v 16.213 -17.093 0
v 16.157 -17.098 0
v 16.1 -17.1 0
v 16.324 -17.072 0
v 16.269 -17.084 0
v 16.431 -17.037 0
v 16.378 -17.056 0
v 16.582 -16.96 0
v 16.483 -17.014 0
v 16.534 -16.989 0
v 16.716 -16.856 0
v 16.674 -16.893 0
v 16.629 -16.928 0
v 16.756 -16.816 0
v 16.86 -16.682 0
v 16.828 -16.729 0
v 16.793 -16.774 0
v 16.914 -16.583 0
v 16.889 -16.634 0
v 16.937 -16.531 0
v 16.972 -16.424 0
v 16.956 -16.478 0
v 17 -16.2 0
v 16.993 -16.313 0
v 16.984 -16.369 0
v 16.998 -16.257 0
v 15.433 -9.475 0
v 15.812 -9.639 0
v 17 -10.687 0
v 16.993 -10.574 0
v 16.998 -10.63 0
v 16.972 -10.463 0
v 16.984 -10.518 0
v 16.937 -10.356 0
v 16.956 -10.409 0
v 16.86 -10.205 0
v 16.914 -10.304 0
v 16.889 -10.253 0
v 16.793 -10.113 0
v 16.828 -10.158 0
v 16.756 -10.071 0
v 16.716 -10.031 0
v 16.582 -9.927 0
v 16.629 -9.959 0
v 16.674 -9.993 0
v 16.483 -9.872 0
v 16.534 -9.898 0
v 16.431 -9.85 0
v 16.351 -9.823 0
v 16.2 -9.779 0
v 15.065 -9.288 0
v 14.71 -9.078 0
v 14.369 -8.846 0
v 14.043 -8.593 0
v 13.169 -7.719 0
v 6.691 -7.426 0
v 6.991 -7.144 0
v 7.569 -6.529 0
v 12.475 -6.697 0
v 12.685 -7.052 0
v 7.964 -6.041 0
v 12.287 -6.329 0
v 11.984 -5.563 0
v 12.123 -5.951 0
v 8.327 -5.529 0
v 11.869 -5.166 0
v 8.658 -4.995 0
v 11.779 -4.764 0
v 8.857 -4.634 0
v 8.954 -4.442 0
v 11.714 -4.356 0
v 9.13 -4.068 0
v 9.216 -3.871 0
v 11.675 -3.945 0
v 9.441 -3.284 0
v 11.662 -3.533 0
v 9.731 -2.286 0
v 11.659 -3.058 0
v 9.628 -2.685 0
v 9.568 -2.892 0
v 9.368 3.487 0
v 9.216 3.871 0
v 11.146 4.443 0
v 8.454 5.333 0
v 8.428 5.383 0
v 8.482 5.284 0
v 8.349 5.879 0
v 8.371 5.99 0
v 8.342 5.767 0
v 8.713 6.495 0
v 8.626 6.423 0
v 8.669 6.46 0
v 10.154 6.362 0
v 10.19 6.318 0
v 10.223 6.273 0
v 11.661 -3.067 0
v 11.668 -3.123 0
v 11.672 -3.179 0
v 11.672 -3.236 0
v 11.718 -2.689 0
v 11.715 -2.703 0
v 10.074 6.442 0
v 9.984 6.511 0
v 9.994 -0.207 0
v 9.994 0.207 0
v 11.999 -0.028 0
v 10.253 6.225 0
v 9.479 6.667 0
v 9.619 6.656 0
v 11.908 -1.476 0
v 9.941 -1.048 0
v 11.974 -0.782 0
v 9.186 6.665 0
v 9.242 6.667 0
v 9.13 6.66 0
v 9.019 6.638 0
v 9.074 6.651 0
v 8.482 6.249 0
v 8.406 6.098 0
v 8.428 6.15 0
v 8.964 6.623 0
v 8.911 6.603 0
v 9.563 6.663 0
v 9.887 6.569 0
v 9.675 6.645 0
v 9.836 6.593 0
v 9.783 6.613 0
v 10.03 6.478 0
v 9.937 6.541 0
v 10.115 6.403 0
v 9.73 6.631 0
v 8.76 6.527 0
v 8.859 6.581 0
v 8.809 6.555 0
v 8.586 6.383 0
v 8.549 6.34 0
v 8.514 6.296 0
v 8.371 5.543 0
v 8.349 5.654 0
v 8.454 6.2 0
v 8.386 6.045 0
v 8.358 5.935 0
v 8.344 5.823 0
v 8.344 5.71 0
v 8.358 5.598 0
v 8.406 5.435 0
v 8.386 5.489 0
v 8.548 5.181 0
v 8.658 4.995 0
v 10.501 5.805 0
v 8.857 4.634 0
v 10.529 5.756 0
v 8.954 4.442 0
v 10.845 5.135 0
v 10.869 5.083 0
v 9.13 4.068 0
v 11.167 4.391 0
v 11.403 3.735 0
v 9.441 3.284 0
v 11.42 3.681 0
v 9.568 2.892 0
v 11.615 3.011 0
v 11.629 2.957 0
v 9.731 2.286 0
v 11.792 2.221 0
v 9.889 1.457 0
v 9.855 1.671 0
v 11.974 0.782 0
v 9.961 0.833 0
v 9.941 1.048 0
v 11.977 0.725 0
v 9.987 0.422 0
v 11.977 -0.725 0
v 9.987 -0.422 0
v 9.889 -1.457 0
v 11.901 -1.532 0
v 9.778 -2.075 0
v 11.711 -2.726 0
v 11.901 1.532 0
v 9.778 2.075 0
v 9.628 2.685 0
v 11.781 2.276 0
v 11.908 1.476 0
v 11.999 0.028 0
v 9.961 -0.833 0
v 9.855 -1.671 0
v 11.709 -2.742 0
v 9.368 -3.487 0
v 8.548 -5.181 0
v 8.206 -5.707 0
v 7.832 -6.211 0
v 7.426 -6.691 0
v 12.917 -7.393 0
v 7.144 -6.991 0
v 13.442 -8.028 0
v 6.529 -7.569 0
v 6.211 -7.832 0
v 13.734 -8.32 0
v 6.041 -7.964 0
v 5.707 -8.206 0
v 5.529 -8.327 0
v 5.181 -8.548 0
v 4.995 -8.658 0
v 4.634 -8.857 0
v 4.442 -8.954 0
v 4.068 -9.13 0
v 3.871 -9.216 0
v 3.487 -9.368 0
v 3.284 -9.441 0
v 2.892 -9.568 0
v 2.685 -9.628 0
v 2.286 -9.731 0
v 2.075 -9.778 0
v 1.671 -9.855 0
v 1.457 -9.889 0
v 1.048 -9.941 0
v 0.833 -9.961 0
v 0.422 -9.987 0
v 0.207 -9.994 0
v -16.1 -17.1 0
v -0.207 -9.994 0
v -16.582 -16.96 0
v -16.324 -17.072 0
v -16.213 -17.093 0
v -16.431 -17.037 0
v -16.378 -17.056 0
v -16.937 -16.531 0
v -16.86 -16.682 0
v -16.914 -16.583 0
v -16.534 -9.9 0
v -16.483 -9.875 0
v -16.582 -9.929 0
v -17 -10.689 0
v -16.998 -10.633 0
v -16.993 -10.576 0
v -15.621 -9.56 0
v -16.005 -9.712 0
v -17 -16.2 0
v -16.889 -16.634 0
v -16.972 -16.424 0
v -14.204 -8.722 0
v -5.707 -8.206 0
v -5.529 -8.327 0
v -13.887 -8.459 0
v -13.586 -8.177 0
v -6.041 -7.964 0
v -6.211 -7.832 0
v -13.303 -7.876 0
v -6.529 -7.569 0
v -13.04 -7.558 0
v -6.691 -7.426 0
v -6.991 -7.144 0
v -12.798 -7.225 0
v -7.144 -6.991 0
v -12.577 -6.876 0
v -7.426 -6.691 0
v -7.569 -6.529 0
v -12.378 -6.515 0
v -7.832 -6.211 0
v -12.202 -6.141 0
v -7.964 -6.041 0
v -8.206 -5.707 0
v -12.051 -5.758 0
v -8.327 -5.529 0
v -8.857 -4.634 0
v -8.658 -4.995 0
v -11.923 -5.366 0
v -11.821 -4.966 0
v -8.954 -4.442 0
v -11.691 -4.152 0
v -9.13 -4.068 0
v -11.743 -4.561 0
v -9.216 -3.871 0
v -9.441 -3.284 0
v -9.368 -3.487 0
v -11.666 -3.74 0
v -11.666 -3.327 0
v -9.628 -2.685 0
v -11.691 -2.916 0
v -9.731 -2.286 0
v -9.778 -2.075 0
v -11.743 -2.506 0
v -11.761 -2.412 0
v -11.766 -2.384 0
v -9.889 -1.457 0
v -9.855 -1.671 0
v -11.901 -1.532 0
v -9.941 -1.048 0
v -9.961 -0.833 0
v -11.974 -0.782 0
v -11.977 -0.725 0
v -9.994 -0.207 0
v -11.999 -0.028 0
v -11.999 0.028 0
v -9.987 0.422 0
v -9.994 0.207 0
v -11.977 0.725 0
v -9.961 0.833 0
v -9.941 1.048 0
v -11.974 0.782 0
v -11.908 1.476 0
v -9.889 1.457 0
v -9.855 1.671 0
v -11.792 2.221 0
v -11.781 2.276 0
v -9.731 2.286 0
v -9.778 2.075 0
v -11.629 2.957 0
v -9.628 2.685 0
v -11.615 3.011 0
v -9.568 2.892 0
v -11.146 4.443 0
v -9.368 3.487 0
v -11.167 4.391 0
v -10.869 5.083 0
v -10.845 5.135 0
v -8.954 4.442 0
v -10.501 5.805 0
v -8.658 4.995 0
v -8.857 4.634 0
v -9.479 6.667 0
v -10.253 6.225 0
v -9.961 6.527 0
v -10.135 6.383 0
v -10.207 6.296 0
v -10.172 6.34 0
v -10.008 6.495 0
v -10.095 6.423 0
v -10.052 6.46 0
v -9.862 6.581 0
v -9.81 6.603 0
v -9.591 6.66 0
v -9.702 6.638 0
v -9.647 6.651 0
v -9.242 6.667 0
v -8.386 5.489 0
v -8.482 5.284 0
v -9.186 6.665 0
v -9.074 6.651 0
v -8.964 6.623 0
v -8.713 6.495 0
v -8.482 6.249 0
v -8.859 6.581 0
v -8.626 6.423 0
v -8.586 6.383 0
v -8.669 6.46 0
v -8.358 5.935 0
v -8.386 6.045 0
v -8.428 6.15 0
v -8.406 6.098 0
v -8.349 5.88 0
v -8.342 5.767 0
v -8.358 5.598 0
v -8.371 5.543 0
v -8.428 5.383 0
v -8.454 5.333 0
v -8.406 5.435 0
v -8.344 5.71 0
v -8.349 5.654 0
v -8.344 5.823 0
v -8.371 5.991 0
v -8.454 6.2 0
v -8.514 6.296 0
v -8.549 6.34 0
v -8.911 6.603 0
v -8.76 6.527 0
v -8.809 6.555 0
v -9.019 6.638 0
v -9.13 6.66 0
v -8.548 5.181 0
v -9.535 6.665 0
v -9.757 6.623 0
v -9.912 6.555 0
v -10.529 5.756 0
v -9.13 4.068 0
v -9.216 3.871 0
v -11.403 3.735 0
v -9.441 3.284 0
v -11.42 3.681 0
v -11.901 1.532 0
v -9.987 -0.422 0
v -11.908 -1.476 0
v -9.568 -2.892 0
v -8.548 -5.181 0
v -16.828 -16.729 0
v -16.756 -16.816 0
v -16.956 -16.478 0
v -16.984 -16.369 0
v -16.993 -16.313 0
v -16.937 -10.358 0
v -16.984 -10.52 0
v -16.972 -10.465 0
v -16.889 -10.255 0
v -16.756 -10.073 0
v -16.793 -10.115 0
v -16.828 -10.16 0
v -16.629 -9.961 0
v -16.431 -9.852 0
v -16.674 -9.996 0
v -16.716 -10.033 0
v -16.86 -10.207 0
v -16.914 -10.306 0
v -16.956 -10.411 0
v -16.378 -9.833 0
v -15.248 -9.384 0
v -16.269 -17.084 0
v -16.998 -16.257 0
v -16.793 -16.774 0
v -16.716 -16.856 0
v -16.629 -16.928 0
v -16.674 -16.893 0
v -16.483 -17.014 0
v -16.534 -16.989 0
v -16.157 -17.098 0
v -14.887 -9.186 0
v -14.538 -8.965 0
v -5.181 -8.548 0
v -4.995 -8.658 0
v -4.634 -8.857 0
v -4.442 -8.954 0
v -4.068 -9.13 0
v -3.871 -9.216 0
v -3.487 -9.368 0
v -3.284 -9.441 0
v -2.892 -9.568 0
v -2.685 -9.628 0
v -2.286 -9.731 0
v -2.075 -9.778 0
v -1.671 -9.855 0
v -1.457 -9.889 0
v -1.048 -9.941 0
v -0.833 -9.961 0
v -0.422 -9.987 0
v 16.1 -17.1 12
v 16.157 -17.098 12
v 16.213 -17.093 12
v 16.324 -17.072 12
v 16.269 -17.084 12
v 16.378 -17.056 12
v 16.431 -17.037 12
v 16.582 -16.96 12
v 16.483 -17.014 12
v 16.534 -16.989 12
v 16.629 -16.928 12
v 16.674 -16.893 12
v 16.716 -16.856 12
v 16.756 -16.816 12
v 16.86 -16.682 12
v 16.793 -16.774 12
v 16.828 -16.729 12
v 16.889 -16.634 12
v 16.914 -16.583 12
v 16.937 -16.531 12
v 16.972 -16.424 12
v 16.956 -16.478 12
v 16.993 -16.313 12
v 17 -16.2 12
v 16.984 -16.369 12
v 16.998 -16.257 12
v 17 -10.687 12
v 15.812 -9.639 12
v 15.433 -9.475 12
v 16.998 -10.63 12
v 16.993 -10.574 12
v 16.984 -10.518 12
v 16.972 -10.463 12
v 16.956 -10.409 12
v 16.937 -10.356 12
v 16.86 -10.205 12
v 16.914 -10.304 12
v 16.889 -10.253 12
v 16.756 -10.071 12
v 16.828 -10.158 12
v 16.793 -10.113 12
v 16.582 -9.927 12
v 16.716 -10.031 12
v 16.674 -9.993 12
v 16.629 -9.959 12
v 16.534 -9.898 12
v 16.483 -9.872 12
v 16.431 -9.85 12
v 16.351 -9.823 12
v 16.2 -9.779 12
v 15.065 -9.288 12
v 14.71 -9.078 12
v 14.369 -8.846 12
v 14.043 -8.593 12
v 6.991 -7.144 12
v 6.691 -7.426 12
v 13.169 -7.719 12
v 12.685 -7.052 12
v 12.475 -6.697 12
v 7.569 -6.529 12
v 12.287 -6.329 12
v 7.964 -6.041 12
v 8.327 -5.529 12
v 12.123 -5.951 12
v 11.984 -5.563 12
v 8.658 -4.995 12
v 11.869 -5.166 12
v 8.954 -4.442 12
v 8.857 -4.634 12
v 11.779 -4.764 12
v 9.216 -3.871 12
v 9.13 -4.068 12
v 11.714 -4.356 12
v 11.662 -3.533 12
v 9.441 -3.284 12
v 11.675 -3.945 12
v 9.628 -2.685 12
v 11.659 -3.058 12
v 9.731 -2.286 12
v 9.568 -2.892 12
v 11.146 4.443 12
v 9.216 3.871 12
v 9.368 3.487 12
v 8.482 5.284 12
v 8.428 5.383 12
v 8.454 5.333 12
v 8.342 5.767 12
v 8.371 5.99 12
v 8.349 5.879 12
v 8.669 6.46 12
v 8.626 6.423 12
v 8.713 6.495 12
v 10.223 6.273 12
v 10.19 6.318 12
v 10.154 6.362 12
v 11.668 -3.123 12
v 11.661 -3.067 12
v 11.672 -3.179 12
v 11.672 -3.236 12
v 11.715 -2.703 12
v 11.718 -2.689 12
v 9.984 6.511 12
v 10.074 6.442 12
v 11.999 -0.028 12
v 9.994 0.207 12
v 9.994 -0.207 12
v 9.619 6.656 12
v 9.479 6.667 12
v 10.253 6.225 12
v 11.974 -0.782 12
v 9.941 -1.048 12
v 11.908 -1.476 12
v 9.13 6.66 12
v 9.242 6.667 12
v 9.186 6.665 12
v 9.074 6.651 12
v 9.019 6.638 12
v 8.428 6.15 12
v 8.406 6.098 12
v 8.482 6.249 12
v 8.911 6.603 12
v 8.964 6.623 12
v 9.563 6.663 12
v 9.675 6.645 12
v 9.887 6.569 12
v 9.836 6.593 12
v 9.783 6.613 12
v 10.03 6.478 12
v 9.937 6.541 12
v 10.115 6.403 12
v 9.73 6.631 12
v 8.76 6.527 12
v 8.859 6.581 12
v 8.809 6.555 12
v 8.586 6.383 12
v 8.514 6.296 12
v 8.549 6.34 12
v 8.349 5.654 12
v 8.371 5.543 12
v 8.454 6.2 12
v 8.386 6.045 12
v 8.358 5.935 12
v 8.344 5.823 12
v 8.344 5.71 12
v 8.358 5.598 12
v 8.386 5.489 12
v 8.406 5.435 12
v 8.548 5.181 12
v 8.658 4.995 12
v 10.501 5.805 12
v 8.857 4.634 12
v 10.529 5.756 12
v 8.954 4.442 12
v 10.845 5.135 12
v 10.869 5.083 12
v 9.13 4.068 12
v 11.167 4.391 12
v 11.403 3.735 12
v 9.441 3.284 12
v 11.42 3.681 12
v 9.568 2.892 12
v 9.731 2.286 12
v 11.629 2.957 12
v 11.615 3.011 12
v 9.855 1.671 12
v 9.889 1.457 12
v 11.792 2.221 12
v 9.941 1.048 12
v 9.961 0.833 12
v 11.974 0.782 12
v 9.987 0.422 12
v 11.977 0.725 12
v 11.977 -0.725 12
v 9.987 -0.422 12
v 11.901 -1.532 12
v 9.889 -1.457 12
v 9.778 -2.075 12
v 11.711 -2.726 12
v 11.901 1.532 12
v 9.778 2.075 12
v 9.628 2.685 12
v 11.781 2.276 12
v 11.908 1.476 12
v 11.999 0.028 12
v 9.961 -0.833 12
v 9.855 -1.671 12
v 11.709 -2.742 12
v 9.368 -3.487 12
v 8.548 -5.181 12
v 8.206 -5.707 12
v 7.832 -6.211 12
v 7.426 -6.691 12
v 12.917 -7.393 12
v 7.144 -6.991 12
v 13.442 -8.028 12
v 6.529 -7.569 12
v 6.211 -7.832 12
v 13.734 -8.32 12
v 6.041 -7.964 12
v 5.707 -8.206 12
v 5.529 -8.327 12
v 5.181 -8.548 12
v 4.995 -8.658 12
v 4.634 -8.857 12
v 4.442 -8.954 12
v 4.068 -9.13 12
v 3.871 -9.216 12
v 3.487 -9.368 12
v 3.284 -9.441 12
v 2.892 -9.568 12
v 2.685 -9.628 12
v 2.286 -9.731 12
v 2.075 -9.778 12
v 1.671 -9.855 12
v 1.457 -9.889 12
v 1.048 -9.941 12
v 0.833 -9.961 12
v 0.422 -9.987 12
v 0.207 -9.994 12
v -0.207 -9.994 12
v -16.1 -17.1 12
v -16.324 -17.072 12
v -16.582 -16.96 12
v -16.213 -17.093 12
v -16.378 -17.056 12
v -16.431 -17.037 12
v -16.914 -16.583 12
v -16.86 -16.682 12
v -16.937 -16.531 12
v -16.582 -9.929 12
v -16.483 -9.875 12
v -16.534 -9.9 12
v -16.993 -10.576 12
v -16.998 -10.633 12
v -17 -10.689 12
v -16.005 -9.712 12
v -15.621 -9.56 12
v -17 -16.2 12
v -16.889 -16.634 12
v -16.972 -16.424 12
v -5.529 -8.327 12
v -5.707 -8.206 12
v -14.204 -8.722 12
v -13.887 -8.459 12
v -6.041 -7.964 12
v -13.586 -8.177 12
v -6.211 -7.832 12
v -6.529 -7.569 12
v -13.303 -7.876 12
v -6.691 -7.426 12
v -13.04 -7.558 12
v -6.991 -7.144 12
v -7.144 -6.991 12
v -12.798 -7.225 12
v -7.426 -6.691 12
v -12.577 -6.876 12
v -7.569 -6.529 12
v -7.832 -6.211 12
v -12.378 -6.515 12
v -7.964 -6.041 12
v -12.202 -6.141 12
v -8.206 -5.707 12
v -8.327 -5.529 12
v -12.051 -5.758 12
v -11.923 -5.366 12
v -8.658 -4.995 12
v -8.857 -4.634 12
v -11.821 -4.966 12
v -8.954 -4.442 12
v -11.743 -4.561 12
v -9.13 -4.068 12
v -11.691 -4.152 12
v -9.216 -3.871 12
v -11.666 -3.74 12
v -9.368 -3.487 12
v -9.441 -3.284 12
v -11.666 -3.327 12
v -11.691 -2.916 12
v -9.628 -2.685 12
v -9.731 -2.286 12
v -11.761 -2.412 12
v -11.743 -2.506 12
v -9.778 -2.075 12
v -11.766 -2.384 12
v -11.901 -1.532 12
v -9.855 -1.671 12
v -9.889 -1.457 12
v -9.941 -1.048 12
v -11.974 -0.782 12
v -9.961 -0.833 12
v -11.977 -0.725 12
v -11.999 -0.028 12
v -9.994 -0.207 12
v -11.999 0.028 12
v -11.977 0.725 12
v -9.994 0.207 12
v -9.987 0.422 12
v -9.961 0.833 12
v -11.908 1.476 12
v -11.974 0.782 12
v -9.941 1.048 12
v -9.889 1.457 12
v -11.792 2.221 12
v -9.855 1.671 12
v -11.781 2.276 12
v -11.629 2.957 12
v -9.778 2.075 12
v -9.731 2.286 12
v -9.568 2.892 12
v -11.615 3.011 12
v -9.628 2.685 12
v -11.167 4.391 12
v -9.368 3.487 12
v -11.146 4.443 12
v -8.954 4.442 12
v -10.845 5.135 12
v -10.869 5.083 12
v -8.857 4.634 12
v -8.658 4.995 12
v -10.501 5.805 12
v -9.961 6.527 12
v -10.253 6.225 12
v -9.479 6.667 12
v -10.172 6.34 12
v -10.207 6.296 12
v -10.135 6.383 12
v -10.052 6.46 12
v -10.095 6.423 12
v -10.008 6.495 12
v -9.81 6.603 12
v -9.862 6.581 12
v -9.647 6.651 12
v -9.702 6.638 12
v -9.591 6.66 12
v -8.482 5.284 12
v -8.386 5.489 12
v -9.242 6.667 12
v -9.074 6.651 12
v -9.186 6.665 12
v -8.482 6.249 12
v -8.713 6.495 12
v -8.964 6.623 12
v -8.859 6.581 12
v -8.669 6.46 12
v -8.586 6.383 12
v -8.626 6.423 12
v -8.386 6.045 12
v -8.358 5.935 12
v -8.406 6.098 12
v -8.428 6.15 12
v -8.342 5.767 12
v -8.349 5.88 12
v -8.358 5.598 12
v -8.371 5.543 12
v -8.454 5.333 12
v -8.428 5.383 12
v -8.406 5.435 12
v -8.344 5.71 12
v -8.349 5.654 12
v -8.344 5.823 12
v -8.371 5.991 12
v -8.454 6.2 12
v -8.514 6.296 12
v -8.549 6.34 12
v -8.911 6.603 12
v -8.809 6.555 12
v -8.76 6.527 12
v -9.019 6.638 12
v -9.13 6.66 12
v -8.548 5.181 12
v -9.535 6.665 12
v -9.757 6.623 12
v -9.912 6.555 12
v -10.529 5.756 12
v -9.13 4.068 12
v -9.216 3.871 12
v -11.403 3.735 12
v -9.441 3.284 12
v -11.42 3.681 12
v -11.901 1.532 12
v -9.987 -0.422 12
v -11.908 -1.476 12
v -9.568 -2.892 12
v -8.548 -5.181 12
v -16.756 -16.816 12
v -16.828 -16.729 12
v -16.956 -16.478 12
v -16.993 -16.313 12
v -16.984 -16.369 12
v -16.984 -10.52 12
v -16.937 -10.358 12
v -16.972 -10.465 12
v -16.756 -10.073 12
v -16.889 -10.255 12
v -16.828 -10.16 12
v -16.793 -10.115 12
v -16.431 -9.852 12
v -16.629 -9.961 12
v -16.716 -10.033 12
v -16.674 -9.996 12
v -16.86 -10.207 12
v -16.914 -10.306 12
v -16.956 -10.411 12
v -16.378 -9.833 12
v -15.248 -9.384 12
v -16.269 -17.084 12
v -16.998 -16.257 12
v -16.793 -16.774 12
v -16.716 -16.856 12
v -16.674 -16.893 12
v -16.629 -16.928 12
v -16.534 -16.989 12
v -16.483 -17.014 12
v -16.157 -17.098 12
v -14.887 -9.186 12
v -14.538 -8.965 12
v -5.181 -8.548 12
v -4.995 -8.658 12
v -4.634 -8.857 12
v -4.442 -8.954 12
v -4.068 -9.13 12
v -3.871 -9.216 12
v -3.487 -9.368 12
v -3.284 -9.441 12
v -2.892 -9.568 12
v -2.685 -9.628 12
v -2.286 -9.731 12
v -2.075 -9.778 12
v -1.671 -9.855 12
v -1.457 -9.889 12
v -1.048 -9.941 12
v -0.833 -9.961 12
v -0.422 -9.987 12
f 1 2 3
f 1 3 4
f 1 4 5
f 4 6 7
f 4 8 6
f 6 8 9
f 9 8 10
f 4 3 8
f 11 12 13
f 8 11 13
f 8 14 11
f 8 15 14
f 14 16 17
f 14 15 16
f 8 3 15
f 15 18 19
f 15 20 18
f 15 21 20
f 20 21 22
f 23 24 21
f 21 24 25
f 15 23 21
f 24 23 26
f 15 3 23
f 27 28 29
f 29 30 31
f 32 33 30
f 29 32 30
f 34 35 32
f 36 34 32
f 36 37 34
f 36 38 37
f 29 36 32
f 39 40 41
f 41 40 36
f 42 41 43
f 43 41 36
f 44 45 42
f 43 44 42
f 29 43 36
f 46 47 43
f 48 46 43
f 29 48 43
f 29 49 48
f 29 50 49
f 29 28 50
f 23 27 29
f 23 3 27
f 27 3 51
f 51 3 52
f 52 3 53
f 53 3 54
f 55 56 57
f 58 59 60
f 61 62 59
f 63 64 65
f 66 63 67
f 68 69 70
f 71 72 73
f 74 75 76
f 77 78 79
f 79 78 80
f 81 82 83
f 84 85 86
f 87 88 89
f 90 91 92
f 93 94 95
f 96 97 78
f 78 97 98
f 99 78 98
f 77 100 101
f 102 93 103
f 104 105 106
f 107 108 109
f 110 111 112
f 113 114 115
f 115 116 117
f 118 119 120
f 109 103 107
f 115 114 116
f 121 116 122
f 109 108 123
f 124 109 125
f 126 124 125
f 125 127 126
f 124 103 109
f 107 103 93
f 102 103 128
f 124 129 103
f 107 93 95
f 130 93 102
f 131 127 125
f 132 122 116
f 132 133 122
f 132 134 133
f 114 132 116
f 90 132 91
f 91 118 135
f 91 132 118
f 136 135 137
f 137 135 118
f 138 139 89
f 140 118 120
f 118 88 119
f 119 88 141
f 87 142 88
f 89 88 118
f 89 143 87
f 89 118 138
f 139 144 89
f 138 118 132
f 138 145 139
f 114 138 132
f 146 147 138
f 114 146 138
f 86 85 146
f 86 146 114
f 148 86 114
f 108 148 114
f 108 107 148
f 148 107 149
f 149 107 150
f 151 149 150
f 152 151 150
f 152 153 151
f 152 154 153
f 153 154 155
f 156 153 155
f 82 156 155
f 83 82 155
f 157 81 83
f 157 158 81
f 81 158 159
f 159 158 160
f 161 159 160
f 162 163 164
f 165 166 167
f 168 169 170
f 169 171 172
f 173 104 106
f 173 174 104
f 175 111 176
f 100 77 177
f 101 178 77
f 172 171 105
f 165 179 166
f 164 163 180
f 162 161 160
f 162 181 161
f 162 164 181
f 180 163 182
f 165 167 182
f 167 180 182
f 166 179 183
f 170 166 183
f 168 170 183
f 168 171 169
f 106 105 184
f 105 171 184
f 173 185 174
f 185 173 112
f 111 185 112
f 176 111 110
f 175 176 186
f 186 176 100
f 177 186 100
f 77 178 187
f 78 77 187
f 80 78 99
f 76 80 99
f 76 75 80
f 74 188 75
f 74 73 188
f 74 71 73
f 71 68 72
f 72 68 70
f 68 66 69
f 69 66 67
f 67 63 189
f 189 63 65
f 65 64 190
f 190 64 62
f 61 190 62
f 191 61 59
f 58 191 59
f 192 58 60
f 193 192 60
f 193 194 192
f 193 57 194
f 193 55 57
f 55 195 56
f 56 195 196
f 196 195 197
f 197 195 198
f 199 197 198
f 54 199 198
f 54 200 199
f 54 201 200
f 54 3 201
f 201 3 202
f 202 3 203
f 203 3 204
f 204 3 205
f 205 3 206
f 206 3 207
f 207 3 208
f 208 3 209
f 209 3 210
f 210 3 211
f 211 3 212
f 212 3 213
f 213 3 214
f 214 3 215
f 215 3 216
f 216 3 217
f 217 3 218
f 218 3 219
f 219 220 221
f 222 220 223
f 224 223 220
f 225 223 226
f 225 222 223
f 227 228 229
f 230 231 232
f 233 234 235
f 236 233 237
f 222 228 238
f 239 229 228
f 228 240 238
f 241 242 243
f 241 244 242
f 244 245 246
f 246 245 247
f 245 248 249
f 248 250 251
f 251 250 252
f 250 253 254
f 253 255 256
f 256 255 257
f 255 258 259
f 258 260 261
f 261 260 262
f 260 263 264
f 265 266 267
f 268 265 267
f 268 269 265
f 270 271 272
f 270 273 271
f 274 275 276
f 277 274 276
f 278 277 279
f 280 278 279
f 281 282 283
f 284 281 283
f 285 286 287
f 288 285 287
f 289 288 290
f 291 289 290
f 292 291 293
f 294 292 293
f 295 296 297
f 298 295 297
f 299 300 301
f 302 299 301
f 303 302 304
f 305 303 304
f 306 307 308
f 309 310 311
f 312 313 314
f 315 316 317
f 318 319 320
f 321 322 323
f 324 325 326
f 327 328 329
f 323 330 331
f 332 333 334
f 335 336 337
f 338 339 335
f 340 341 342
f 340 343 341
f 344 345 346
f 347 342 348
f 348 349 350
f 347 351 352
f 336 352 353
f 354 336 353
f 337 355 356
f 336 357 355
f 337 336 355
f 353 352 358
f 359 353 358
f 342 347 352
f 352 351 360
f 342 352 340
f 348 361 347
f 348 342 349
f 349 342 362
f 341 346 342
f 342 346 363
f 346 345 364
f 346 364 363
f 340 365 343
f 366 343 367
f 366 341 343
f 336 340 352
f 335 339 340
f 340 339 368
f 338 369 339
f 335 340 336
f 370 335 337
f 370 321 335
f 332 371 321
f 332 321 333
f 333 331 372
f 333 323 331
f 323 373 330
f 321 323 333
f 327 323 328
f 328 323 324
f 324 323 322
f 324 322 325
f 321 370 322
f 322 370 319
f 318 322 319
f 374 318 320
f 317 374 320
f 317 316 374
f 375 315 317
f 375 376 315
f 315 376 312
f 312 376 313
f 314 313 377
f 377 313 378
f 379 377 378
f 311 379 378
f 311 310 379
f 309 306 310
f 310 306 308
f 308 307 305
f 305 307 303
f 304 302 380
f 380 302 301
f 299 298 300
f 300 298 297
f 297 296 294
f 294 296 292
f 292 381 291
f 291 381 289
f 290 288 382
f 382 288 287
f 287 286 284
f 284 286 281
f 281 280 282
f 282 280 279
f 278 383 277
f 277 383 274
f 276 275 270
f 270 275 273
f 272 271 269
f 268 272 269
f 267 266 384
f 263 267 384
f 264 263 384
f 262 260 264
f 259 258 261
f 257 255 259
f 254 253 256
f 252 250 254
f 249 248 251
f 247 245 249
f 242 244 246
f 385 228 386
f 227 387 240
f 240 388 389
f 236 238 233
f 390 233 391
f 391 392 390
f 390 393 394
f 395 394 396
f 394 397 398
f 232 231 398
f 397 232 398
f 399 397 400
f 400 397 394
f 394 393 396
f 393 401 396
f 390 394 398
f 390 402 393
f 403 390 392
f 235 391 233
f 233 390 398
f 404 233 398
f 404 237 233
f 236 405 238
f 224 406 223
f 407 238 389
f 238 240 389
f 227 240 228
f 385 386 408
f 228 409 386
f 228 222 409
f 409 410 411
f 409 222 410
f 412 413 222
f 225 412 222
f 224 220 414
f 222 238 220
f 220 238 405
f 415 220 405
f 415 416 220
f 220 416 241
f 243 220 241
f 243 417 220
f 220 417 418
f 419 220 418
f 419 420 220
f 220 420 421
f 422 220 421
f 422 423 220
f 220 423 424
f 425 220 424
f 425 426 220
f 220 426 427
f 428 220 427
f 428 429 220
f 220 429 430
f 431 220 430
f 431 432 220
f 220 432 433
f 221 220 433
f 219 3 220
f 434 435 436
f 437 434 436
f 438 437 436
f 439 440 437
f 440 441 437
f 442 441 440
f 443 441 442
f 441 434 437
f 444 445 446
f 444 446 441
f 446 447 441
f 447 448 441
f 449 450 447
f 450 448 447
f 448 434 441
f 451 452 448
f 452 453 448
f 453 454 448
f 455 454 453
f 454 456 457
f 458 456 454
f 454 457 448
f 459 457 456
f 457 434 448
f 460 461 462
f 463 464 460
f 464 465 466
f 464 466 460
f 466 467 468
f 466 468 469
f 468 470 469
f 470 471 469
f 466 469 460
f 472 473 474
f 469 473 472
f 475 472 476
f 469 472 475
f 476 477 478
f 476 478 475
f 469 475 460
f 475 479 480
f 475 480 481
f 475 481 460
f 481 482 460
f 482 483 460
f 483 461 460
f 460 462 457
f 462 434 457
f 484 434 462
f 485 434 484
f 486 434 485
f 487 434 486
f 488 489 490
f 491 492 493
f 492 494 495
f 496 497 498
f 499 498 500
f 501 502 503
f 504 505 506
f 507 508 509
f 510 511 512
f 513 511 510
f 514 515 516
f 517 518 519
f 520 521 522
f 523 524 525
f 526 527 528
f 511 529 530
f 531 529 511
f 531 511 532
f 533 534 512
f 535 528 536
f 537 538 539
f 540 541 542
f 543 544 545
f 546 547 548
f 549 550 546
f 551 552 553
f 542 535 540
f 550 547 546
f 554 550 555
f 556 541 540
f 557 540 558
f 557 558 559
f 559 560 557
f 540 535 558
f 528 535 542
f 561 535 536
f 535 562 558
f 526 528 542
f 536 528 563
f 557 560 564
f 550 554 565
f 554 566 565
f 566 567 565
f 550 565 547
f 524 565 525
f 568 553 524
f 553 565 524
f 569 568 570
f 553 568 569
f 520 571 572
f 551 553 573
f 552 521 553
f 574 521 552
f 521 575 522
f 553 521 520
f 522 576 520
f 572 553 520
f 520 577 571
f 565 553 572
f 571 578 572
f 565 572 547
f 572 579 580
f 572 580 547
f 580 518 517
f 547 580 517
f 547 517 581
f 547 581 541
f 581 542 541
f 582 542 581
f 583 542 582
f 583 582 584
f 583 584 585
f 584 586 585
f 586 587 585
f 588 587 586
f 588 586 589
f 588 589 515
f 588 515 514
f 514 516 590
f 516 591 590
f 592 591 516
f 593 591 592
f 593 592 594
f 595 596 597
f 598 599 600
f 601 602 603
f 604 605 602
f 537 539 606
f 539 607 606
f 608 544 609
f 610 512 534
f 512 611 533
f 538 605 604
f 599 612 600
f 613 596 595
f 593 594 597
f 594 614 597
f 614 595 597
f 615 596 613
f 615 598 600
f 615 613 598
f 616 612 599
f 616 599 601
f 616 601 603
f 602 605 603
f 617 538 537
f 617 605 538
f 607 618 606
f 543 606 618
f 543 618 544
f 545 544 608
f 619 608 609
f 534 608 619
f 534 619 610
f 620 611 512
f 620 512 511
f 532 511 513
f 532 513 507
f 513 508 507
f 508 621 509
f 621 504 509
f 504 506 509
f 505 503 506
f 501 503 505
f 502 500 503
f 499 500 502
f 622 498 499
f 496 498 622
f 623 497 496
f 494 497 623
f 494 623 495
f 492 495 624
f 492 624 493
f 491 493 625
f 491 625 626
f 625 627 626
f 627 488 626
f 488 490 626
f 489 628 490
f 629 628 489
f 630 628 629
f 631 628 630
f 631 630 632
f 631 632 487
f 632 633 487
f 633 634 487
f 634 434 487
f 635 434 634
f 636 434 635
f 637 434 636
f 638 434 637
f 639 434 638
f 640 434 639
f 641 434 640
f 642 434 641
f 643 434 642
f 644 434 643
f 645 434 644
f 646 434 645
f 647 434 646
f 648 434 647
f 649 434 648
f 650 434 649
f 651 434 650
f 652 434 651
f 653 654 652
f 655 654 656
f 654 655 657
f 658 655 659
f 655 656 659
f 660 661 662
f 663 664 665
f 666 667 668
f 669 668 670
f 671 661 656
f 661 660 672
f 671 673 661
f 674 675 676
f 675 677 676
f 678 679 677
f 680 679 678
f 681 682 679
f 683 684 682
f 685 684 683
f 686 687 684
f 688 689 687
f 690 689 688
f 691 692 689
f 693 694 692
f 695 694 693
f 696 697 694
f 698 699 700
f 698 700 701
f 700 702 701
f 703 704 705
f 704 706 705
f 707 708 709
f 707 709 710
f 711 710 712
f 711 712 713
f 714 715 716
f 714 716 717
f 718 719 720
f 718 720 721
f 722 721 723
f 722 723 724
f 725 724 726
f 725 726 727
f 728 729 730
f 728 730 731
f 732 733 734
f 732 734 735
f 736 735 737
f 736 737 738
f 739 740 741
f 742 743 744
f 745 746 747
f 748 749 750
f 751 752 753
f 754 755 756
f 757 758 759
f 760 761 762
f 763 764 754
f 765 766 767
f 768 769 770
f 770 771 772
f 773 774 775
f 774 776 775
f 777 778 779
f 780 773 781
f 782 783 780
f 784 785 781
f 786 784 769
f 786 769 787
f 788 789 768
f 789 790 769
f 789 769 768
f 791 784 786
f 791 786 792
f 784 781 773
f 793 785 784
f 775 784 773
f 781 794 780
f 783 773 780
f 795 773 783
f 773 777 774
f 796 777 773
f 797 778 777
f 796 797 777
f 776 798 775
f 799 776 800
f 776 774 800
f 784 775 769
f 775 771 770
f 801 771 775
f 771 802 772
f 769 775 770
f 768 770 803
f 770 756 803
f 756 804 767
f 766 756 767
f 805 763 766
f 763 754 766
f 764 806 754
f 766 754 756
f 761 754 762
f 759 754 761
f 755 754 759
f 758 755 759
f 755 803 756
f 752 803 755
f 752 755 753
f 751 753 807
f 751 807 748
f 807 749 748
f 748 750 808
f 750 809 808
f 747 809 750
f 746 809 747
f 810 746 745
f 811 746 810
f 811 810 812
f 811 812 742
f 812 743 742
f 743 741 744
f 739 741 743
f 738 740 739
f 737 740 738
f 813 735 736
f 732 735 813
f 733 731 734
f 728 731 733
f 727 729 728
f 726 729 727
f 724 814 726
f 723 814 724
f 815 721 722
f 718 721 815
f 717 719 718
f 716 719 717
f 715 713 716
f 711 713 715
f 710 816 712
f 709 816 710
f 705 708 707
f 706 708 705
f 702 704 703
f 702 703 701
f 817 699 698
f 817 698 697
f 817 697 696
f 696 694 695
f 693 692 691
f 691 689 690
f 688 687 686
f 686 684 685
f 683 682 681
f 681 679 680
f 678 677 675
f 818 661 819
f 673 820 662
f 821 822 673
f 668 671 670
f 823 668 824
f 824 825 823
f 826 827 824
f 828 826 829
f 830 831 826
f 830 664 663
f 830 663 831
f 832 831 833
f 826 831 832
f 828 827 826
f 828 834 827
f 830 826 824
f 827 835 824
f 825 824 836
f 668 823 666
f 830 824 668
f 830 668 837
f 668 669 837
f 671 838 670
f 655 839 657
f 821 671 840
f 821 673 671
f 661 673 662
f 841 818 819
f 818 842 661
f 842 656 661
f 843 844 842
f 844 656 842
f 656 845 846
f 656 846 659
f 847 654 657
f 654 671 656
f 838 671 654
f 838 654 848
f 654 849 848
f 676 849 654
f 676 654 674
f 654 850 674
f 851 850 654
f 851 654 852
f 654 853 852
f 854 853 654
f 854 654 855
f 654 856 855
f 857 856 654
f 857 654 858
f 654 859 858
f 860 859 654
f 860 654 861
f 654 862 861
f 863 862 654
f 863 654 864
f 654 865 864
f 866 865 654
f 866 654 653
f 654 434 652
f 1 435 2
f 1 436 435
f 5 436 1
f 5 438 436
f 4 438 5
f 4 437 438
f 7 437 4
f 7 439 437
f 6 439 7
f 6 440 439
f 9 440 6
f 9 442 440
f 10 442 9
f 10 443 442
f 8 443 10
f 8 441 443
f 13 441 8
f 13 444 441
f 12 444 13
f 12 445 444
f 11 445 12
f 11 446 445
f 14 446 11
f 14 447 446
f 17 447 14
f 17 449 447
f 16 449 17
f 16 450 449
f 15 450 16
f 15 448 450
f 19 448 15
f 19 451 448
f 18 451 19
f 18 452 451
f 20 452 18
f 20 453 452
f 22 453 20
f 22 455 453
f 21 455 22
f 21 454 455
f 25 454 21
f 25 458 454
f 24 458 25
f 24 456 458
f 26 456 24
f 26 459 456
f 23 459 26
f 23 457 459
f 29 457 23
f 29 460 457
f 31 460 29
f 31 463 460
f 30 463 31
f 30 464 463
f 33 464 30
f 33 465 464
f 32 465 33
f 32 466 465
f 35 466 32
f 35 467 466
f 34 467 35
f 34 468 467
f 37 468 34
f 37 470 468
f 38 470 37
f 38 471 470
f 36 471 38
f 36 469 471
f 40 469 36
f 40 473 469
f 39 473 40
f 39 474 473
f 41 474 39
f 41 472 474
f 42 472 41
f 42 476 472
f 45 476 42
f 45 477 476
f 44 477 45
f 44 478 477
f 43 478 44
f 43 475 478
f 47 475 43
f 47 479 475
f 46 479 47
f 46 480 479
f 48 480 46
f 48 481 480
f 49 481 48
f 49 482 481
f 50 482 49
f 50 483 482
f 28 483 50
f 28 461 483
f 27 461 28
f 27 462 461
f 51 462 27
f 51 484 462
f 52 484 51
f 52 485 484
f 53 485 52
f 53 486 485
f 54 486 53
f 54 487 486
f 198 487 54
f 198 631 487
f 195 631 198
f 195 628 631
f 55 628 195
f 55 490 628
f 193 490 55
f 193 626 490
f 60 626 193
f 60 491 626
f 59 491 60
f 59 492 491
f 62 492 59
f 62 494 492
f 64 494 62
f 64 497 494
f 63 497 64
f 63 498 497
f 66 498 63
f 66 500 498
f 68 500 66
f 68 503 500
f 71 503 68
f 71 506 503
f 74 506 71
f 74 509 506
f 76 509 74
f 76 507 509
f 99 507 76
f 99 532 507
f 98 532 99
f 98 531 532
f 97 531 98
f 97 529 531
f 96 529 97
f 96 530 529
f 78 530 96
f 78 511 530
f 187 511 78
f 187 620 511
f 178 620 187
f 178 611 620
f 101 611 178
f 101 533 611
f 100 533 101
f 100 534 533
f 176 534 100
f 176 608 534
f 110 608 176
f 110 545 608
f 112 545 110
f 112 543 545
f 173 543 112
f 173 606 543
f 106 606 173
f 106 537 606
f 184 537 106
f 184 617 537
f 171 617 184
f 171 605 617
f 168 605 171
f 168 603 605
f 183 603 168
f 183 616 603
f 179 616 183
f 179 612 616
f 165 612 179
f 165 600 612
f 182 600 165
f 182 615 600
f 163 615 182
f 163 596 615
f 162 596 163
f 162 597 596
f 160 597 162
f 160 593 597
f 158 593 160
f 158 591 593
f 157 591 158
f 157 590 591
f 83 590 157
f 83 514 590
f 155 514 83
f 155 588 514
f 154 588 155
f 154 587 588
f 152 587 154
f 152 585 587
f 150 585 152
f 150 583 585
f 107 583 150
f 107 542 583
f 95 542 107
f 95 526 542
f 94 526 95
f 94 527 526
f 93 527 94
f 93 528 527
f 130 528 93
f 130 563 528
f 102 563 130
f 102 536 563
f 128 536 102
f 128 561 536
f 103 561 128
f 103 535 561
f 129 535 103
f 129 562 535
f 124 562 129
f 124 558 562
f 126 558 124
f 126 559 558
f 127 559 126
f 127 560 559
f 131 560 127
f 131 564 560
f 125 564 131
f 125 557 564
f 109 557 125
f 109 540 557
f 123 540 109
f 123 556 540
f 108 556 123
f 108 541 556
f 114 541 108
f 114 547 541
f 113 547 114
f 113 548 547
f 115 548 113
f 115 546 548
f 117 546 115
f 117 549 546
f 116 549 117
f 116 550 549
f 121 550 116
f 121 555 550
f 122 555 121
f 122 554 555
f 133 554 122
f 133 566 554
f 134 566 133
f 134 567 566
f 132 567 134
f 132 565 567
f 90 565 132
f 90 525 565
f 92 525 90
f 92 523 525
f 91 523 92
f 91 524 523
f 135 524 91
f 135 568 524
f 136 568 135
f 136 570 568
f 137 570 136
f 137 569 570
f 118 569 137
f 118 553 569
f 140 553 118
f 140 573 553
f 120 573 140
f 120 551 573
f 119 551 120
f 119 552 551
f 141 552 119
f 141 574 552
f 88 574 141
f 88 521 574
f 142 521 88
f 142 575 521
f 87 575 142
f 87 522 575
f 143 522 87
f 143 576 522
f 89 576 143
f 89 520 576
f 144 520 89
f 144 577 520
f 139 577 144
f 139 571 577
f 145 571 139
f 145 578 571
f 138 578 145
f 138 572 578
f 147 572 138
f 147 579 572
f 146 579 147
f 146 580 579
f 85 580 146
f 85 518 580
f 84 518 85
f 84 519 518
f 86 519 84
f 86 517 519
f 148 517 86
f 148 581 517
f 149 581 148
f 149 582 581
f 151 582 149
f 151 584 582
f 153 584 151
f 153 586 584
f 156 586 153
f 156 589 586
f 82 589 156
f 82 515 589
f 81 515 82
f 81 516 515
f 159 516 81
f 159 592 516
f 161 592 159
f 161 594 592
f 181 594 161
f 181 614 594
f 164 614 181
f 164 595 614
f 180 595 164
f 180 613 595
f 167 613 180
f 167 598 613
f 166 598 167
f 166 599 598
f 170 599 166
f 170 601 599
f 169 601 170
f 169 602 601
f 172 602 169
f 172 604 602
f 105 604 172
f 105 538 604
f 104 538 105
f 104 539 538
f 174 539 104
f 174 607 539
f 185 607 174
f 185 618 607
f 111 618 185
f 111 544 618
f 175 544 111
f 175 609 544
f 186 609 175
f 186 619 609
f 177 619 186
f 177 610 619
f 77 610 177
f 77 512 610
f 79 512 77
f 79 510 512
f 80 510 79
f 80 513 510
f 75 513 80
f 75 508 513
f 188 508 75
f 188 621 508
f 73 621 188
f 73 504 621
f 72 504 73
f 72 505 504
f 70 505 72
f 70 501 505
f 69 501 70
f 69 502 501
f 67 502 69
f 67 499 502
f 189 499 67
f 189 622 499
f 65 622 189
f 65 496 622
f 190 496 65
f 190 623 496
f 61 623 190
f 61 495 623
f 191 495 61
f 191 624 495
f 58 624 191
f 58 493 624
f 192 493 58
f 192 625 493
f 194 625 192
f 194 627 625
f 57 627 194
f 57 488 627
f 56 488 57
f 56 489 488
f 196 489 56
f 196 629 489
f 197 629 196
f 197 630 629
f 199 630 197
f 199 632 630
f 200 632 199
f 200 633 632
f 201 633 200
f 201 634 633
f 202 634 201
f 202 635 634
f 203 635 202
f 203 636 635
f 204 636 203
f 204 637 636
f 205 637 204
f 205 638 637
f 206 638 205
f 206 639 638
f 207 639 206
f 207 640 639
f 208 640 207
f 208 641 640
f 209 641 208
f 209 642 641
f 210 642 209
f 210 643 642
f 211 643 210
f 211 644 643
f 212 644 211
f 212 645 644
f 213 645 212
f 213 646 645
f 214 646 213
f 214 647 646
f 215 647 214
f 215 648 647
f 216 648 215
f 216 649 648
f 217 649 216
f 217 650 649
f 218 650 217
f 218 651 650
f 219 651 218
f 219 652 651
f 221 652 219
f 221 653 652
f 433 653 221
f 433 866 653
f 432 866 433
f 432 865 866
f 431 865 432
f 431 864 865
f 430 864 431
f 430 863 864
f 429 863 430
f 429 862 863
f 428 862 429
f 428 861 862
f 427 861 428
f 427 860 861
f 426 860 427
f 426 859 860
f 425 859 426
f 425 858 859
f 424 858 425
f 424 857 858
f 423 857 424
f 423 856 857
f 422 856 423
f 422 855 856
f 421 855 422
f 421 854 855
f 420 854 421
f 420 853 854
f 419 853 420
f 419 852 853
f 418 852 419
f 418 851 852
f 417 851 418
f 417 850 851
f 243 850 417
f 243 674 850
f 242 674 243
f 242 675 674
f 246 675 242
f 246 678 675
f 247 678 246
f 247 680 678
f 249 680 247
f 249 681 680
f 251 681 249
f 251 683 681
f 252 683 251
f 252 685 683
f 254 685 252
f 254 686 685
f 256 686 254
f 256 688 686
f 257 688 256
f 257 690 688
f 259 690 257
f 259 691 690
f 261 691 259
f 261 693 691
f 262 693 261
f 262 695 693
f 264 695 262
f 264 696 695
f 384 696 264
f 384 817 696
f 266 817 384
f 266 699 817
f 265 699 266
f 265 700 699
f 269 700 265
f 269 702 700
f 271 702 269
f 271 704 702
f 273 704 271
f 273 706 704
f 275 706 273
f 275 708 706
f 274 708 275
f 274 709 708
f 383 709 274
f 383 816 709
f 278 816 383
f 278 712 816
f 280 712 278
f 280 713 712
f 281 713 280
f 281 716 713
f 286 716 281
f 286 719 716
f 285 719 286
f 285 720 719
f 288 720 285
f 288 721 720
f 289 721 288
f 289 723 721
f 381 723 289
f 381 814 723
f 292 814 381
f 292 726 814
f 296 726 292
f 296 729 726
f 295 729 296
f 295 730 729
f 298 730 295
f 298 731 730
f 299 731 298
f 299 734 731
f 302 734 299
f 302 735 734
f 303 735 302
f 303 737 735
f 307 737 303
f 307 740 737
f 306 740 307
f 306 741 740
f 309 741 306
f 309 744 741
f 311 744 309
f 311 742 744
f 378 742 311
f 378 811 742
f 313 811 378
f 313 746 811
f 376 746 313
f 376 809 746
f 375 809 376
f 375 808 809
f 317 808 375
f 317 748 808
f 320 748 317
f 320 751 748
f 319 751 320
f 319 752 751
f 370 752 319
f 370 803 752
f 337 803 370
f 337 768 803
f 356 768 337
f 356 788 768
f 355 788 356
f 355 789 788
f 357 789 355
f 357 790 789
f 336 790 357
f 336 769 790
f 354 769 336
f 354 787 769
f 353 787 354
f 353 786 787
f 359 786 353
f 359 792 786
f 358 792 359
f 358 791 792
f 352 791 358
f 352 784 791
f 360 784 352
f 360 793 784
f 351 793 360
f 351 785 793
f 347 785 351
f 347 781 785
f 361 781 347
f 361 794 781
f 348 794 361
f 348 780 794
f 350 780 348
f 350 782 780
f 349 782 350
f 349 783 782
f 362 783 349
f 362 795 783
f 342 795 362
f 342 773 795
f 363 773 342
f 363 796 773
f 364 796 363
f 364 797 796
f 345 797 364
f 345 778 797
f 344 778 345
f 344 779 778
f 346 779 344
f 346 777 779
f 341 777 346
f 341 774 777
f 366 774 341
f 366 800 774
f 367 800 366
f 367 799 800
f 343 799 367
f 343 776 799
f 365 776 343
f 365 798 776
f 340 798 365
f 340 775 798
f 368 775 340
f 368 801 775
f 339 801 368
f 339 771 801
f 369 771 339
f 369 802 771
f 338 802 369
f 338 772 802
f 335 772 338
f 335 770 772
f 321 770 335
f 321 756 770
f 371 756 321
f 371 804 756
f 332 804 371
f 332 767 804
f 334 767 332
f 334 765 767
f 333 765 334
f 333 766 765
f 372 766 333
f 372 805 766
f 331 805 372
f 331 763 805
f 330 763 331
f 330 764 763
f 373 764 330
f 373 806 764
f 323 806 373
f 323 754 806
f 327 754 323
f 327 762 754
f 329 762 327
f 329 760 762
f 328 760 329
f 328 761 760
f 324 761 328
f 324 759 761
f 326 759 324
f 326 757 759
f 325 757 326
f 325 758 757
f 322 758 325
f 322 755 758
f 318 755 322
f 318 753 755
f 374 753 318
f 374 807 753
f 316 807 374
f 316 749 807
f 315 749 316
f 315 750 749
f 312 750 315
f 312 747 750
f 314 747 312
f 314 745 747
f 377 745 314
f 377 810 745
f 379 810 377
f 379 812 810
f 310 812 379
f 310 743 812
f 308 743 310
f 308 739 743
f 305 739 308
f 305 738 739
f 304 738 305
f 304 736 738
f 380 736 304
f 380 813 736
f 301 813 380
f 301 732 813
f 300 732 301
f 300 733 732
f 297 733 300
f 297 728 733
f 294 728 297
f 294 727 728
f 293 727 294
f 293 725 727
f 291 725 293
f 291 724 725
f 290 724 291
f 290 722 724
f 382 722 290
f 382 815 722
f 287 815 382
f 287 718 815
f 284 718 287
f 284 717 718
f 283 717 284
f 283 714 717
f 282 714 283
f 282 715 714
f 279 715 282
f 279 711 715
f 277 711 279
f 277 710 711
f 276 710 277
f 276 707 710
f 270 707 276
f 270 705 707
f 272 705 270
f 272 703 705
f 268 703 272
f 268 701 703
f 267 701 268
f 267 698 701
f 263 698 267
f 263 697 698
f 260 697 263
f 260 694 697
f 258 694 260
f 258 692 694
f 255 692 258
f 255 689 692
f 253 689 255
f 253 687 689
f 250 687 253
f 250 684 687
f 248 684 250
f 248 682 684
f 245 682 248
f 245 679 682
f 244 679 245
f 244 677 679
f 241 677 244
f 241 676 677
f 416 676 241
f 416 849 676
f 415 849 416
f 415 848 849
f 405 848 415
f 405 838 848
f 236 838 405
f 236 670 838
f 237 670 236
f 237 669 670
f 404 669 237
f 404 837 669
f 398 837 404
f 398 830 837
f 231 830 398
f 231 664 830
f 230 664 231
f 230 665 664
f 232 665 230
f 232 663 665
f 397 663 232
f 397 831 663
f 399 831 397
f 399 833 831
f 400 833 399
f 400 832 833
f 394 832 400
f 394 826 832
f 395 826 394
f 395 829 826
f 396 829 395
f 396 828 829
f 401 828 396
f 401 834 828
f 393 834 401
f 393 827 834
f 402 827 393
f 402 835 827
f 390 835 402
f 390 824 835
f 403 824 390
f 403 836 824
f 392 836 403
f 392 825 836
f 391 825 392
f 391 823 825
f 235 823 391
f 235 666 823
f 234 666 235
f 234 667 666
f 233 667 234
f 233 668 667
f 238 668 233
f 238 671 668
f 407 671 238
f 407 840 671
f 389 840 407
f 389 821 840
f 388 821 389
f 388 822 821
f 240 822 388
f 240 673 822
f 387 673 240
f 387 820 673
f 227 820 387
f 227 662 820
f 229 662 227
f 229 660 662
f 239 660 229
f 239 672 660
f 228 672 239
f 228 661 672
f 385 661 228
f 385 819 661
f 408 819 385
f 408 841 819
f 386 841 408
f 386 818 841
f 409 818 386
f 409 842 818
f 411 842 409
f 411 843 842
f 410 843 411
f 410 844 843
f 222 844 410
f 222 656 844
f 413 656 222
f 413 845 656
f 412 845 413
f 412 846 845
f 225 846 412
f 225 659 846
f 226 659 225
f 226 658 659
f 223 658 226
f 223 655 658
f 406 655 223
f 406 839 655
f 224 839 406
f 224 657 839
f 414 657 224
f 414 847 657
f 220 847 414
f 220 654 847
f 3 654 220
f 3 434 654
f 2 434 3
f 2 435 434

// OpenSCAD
///OpenSCAD version 2015.03-2/////////////////// 
////////////////////////////////////////////////
// OpenSCAD File V1.0 by Ken_Applications //////
/////          03 - 01 - 2018              /////
////////////////////////////////////////////////
////////////////////////////////////////////////

Diameter_to_grip=20;
Number_of_clips=1;
clip_height=12;
width_of_base=34;
depth_of_base=7;
clip_wall_thickness=2;
center_line_distance=36;


module contor1(){
 translate([0,-dist_from_cl,0]) square([width_of_base,depth_of_base],true);
 contor();
}


////calculations//////////////
the_fillet_r=(clip_wall_thickness/2)-0.1;
outer_dia=Diameter_to_grip+(2*clip_wall_thickness);
dist_from_cl=((Diameter_to_grip/2)+(depth_of_base/2))+0.1;
grip_offset=Diameter_to_grip/3;
blend_radius=(Diameter_to_grip/3)-0.1;
move_bit=(Diameter_to_grip/2)+depth_of_base;
//////////////////////////////


module clip_cyl(){
difference(){
cylinder(h=2, d1=outer_dia, d2=outer_dia, center=false,$fn=100);
translate([0,0,-1])cylinder(h=clip_height, d1=Diameter_to_grip, d2=Diameter_to_grip, center=false,$fn=100);
translate([-width_of_base,grip_offset,-1]) cube([width_of_base*2,width_of_base,2],false);
    }
}

module contor(){
projection(cut = true) 
clip_cyl();
}

module fillet(r) {
   offset(r = -r) {
     offset(delta = r) {
       contor1();
     }
   }
}

module fillet2(r) {
   offset(r = -r) {
     offset(delta = r) {
       clip();
     }
   }
}

module clip(){
fillet(blend_radius,false,$fn=100);
}

module clip_without_hole(){
linear_extrude(height=clip_height)
    fillet2(-the_fillet_r,false,$fn=100);
}


module finish(){
clip_without_hole();

for (x = [1:1:Number_of_clips-1] ){
translate([-x*center_line_distance,0,0]) clip_without_hole();
translate([-x*center_line_distance,-move_bit,0]) cube([x*center_line_distance,depth_of_base,clip_height],false);
}
}


finish();
